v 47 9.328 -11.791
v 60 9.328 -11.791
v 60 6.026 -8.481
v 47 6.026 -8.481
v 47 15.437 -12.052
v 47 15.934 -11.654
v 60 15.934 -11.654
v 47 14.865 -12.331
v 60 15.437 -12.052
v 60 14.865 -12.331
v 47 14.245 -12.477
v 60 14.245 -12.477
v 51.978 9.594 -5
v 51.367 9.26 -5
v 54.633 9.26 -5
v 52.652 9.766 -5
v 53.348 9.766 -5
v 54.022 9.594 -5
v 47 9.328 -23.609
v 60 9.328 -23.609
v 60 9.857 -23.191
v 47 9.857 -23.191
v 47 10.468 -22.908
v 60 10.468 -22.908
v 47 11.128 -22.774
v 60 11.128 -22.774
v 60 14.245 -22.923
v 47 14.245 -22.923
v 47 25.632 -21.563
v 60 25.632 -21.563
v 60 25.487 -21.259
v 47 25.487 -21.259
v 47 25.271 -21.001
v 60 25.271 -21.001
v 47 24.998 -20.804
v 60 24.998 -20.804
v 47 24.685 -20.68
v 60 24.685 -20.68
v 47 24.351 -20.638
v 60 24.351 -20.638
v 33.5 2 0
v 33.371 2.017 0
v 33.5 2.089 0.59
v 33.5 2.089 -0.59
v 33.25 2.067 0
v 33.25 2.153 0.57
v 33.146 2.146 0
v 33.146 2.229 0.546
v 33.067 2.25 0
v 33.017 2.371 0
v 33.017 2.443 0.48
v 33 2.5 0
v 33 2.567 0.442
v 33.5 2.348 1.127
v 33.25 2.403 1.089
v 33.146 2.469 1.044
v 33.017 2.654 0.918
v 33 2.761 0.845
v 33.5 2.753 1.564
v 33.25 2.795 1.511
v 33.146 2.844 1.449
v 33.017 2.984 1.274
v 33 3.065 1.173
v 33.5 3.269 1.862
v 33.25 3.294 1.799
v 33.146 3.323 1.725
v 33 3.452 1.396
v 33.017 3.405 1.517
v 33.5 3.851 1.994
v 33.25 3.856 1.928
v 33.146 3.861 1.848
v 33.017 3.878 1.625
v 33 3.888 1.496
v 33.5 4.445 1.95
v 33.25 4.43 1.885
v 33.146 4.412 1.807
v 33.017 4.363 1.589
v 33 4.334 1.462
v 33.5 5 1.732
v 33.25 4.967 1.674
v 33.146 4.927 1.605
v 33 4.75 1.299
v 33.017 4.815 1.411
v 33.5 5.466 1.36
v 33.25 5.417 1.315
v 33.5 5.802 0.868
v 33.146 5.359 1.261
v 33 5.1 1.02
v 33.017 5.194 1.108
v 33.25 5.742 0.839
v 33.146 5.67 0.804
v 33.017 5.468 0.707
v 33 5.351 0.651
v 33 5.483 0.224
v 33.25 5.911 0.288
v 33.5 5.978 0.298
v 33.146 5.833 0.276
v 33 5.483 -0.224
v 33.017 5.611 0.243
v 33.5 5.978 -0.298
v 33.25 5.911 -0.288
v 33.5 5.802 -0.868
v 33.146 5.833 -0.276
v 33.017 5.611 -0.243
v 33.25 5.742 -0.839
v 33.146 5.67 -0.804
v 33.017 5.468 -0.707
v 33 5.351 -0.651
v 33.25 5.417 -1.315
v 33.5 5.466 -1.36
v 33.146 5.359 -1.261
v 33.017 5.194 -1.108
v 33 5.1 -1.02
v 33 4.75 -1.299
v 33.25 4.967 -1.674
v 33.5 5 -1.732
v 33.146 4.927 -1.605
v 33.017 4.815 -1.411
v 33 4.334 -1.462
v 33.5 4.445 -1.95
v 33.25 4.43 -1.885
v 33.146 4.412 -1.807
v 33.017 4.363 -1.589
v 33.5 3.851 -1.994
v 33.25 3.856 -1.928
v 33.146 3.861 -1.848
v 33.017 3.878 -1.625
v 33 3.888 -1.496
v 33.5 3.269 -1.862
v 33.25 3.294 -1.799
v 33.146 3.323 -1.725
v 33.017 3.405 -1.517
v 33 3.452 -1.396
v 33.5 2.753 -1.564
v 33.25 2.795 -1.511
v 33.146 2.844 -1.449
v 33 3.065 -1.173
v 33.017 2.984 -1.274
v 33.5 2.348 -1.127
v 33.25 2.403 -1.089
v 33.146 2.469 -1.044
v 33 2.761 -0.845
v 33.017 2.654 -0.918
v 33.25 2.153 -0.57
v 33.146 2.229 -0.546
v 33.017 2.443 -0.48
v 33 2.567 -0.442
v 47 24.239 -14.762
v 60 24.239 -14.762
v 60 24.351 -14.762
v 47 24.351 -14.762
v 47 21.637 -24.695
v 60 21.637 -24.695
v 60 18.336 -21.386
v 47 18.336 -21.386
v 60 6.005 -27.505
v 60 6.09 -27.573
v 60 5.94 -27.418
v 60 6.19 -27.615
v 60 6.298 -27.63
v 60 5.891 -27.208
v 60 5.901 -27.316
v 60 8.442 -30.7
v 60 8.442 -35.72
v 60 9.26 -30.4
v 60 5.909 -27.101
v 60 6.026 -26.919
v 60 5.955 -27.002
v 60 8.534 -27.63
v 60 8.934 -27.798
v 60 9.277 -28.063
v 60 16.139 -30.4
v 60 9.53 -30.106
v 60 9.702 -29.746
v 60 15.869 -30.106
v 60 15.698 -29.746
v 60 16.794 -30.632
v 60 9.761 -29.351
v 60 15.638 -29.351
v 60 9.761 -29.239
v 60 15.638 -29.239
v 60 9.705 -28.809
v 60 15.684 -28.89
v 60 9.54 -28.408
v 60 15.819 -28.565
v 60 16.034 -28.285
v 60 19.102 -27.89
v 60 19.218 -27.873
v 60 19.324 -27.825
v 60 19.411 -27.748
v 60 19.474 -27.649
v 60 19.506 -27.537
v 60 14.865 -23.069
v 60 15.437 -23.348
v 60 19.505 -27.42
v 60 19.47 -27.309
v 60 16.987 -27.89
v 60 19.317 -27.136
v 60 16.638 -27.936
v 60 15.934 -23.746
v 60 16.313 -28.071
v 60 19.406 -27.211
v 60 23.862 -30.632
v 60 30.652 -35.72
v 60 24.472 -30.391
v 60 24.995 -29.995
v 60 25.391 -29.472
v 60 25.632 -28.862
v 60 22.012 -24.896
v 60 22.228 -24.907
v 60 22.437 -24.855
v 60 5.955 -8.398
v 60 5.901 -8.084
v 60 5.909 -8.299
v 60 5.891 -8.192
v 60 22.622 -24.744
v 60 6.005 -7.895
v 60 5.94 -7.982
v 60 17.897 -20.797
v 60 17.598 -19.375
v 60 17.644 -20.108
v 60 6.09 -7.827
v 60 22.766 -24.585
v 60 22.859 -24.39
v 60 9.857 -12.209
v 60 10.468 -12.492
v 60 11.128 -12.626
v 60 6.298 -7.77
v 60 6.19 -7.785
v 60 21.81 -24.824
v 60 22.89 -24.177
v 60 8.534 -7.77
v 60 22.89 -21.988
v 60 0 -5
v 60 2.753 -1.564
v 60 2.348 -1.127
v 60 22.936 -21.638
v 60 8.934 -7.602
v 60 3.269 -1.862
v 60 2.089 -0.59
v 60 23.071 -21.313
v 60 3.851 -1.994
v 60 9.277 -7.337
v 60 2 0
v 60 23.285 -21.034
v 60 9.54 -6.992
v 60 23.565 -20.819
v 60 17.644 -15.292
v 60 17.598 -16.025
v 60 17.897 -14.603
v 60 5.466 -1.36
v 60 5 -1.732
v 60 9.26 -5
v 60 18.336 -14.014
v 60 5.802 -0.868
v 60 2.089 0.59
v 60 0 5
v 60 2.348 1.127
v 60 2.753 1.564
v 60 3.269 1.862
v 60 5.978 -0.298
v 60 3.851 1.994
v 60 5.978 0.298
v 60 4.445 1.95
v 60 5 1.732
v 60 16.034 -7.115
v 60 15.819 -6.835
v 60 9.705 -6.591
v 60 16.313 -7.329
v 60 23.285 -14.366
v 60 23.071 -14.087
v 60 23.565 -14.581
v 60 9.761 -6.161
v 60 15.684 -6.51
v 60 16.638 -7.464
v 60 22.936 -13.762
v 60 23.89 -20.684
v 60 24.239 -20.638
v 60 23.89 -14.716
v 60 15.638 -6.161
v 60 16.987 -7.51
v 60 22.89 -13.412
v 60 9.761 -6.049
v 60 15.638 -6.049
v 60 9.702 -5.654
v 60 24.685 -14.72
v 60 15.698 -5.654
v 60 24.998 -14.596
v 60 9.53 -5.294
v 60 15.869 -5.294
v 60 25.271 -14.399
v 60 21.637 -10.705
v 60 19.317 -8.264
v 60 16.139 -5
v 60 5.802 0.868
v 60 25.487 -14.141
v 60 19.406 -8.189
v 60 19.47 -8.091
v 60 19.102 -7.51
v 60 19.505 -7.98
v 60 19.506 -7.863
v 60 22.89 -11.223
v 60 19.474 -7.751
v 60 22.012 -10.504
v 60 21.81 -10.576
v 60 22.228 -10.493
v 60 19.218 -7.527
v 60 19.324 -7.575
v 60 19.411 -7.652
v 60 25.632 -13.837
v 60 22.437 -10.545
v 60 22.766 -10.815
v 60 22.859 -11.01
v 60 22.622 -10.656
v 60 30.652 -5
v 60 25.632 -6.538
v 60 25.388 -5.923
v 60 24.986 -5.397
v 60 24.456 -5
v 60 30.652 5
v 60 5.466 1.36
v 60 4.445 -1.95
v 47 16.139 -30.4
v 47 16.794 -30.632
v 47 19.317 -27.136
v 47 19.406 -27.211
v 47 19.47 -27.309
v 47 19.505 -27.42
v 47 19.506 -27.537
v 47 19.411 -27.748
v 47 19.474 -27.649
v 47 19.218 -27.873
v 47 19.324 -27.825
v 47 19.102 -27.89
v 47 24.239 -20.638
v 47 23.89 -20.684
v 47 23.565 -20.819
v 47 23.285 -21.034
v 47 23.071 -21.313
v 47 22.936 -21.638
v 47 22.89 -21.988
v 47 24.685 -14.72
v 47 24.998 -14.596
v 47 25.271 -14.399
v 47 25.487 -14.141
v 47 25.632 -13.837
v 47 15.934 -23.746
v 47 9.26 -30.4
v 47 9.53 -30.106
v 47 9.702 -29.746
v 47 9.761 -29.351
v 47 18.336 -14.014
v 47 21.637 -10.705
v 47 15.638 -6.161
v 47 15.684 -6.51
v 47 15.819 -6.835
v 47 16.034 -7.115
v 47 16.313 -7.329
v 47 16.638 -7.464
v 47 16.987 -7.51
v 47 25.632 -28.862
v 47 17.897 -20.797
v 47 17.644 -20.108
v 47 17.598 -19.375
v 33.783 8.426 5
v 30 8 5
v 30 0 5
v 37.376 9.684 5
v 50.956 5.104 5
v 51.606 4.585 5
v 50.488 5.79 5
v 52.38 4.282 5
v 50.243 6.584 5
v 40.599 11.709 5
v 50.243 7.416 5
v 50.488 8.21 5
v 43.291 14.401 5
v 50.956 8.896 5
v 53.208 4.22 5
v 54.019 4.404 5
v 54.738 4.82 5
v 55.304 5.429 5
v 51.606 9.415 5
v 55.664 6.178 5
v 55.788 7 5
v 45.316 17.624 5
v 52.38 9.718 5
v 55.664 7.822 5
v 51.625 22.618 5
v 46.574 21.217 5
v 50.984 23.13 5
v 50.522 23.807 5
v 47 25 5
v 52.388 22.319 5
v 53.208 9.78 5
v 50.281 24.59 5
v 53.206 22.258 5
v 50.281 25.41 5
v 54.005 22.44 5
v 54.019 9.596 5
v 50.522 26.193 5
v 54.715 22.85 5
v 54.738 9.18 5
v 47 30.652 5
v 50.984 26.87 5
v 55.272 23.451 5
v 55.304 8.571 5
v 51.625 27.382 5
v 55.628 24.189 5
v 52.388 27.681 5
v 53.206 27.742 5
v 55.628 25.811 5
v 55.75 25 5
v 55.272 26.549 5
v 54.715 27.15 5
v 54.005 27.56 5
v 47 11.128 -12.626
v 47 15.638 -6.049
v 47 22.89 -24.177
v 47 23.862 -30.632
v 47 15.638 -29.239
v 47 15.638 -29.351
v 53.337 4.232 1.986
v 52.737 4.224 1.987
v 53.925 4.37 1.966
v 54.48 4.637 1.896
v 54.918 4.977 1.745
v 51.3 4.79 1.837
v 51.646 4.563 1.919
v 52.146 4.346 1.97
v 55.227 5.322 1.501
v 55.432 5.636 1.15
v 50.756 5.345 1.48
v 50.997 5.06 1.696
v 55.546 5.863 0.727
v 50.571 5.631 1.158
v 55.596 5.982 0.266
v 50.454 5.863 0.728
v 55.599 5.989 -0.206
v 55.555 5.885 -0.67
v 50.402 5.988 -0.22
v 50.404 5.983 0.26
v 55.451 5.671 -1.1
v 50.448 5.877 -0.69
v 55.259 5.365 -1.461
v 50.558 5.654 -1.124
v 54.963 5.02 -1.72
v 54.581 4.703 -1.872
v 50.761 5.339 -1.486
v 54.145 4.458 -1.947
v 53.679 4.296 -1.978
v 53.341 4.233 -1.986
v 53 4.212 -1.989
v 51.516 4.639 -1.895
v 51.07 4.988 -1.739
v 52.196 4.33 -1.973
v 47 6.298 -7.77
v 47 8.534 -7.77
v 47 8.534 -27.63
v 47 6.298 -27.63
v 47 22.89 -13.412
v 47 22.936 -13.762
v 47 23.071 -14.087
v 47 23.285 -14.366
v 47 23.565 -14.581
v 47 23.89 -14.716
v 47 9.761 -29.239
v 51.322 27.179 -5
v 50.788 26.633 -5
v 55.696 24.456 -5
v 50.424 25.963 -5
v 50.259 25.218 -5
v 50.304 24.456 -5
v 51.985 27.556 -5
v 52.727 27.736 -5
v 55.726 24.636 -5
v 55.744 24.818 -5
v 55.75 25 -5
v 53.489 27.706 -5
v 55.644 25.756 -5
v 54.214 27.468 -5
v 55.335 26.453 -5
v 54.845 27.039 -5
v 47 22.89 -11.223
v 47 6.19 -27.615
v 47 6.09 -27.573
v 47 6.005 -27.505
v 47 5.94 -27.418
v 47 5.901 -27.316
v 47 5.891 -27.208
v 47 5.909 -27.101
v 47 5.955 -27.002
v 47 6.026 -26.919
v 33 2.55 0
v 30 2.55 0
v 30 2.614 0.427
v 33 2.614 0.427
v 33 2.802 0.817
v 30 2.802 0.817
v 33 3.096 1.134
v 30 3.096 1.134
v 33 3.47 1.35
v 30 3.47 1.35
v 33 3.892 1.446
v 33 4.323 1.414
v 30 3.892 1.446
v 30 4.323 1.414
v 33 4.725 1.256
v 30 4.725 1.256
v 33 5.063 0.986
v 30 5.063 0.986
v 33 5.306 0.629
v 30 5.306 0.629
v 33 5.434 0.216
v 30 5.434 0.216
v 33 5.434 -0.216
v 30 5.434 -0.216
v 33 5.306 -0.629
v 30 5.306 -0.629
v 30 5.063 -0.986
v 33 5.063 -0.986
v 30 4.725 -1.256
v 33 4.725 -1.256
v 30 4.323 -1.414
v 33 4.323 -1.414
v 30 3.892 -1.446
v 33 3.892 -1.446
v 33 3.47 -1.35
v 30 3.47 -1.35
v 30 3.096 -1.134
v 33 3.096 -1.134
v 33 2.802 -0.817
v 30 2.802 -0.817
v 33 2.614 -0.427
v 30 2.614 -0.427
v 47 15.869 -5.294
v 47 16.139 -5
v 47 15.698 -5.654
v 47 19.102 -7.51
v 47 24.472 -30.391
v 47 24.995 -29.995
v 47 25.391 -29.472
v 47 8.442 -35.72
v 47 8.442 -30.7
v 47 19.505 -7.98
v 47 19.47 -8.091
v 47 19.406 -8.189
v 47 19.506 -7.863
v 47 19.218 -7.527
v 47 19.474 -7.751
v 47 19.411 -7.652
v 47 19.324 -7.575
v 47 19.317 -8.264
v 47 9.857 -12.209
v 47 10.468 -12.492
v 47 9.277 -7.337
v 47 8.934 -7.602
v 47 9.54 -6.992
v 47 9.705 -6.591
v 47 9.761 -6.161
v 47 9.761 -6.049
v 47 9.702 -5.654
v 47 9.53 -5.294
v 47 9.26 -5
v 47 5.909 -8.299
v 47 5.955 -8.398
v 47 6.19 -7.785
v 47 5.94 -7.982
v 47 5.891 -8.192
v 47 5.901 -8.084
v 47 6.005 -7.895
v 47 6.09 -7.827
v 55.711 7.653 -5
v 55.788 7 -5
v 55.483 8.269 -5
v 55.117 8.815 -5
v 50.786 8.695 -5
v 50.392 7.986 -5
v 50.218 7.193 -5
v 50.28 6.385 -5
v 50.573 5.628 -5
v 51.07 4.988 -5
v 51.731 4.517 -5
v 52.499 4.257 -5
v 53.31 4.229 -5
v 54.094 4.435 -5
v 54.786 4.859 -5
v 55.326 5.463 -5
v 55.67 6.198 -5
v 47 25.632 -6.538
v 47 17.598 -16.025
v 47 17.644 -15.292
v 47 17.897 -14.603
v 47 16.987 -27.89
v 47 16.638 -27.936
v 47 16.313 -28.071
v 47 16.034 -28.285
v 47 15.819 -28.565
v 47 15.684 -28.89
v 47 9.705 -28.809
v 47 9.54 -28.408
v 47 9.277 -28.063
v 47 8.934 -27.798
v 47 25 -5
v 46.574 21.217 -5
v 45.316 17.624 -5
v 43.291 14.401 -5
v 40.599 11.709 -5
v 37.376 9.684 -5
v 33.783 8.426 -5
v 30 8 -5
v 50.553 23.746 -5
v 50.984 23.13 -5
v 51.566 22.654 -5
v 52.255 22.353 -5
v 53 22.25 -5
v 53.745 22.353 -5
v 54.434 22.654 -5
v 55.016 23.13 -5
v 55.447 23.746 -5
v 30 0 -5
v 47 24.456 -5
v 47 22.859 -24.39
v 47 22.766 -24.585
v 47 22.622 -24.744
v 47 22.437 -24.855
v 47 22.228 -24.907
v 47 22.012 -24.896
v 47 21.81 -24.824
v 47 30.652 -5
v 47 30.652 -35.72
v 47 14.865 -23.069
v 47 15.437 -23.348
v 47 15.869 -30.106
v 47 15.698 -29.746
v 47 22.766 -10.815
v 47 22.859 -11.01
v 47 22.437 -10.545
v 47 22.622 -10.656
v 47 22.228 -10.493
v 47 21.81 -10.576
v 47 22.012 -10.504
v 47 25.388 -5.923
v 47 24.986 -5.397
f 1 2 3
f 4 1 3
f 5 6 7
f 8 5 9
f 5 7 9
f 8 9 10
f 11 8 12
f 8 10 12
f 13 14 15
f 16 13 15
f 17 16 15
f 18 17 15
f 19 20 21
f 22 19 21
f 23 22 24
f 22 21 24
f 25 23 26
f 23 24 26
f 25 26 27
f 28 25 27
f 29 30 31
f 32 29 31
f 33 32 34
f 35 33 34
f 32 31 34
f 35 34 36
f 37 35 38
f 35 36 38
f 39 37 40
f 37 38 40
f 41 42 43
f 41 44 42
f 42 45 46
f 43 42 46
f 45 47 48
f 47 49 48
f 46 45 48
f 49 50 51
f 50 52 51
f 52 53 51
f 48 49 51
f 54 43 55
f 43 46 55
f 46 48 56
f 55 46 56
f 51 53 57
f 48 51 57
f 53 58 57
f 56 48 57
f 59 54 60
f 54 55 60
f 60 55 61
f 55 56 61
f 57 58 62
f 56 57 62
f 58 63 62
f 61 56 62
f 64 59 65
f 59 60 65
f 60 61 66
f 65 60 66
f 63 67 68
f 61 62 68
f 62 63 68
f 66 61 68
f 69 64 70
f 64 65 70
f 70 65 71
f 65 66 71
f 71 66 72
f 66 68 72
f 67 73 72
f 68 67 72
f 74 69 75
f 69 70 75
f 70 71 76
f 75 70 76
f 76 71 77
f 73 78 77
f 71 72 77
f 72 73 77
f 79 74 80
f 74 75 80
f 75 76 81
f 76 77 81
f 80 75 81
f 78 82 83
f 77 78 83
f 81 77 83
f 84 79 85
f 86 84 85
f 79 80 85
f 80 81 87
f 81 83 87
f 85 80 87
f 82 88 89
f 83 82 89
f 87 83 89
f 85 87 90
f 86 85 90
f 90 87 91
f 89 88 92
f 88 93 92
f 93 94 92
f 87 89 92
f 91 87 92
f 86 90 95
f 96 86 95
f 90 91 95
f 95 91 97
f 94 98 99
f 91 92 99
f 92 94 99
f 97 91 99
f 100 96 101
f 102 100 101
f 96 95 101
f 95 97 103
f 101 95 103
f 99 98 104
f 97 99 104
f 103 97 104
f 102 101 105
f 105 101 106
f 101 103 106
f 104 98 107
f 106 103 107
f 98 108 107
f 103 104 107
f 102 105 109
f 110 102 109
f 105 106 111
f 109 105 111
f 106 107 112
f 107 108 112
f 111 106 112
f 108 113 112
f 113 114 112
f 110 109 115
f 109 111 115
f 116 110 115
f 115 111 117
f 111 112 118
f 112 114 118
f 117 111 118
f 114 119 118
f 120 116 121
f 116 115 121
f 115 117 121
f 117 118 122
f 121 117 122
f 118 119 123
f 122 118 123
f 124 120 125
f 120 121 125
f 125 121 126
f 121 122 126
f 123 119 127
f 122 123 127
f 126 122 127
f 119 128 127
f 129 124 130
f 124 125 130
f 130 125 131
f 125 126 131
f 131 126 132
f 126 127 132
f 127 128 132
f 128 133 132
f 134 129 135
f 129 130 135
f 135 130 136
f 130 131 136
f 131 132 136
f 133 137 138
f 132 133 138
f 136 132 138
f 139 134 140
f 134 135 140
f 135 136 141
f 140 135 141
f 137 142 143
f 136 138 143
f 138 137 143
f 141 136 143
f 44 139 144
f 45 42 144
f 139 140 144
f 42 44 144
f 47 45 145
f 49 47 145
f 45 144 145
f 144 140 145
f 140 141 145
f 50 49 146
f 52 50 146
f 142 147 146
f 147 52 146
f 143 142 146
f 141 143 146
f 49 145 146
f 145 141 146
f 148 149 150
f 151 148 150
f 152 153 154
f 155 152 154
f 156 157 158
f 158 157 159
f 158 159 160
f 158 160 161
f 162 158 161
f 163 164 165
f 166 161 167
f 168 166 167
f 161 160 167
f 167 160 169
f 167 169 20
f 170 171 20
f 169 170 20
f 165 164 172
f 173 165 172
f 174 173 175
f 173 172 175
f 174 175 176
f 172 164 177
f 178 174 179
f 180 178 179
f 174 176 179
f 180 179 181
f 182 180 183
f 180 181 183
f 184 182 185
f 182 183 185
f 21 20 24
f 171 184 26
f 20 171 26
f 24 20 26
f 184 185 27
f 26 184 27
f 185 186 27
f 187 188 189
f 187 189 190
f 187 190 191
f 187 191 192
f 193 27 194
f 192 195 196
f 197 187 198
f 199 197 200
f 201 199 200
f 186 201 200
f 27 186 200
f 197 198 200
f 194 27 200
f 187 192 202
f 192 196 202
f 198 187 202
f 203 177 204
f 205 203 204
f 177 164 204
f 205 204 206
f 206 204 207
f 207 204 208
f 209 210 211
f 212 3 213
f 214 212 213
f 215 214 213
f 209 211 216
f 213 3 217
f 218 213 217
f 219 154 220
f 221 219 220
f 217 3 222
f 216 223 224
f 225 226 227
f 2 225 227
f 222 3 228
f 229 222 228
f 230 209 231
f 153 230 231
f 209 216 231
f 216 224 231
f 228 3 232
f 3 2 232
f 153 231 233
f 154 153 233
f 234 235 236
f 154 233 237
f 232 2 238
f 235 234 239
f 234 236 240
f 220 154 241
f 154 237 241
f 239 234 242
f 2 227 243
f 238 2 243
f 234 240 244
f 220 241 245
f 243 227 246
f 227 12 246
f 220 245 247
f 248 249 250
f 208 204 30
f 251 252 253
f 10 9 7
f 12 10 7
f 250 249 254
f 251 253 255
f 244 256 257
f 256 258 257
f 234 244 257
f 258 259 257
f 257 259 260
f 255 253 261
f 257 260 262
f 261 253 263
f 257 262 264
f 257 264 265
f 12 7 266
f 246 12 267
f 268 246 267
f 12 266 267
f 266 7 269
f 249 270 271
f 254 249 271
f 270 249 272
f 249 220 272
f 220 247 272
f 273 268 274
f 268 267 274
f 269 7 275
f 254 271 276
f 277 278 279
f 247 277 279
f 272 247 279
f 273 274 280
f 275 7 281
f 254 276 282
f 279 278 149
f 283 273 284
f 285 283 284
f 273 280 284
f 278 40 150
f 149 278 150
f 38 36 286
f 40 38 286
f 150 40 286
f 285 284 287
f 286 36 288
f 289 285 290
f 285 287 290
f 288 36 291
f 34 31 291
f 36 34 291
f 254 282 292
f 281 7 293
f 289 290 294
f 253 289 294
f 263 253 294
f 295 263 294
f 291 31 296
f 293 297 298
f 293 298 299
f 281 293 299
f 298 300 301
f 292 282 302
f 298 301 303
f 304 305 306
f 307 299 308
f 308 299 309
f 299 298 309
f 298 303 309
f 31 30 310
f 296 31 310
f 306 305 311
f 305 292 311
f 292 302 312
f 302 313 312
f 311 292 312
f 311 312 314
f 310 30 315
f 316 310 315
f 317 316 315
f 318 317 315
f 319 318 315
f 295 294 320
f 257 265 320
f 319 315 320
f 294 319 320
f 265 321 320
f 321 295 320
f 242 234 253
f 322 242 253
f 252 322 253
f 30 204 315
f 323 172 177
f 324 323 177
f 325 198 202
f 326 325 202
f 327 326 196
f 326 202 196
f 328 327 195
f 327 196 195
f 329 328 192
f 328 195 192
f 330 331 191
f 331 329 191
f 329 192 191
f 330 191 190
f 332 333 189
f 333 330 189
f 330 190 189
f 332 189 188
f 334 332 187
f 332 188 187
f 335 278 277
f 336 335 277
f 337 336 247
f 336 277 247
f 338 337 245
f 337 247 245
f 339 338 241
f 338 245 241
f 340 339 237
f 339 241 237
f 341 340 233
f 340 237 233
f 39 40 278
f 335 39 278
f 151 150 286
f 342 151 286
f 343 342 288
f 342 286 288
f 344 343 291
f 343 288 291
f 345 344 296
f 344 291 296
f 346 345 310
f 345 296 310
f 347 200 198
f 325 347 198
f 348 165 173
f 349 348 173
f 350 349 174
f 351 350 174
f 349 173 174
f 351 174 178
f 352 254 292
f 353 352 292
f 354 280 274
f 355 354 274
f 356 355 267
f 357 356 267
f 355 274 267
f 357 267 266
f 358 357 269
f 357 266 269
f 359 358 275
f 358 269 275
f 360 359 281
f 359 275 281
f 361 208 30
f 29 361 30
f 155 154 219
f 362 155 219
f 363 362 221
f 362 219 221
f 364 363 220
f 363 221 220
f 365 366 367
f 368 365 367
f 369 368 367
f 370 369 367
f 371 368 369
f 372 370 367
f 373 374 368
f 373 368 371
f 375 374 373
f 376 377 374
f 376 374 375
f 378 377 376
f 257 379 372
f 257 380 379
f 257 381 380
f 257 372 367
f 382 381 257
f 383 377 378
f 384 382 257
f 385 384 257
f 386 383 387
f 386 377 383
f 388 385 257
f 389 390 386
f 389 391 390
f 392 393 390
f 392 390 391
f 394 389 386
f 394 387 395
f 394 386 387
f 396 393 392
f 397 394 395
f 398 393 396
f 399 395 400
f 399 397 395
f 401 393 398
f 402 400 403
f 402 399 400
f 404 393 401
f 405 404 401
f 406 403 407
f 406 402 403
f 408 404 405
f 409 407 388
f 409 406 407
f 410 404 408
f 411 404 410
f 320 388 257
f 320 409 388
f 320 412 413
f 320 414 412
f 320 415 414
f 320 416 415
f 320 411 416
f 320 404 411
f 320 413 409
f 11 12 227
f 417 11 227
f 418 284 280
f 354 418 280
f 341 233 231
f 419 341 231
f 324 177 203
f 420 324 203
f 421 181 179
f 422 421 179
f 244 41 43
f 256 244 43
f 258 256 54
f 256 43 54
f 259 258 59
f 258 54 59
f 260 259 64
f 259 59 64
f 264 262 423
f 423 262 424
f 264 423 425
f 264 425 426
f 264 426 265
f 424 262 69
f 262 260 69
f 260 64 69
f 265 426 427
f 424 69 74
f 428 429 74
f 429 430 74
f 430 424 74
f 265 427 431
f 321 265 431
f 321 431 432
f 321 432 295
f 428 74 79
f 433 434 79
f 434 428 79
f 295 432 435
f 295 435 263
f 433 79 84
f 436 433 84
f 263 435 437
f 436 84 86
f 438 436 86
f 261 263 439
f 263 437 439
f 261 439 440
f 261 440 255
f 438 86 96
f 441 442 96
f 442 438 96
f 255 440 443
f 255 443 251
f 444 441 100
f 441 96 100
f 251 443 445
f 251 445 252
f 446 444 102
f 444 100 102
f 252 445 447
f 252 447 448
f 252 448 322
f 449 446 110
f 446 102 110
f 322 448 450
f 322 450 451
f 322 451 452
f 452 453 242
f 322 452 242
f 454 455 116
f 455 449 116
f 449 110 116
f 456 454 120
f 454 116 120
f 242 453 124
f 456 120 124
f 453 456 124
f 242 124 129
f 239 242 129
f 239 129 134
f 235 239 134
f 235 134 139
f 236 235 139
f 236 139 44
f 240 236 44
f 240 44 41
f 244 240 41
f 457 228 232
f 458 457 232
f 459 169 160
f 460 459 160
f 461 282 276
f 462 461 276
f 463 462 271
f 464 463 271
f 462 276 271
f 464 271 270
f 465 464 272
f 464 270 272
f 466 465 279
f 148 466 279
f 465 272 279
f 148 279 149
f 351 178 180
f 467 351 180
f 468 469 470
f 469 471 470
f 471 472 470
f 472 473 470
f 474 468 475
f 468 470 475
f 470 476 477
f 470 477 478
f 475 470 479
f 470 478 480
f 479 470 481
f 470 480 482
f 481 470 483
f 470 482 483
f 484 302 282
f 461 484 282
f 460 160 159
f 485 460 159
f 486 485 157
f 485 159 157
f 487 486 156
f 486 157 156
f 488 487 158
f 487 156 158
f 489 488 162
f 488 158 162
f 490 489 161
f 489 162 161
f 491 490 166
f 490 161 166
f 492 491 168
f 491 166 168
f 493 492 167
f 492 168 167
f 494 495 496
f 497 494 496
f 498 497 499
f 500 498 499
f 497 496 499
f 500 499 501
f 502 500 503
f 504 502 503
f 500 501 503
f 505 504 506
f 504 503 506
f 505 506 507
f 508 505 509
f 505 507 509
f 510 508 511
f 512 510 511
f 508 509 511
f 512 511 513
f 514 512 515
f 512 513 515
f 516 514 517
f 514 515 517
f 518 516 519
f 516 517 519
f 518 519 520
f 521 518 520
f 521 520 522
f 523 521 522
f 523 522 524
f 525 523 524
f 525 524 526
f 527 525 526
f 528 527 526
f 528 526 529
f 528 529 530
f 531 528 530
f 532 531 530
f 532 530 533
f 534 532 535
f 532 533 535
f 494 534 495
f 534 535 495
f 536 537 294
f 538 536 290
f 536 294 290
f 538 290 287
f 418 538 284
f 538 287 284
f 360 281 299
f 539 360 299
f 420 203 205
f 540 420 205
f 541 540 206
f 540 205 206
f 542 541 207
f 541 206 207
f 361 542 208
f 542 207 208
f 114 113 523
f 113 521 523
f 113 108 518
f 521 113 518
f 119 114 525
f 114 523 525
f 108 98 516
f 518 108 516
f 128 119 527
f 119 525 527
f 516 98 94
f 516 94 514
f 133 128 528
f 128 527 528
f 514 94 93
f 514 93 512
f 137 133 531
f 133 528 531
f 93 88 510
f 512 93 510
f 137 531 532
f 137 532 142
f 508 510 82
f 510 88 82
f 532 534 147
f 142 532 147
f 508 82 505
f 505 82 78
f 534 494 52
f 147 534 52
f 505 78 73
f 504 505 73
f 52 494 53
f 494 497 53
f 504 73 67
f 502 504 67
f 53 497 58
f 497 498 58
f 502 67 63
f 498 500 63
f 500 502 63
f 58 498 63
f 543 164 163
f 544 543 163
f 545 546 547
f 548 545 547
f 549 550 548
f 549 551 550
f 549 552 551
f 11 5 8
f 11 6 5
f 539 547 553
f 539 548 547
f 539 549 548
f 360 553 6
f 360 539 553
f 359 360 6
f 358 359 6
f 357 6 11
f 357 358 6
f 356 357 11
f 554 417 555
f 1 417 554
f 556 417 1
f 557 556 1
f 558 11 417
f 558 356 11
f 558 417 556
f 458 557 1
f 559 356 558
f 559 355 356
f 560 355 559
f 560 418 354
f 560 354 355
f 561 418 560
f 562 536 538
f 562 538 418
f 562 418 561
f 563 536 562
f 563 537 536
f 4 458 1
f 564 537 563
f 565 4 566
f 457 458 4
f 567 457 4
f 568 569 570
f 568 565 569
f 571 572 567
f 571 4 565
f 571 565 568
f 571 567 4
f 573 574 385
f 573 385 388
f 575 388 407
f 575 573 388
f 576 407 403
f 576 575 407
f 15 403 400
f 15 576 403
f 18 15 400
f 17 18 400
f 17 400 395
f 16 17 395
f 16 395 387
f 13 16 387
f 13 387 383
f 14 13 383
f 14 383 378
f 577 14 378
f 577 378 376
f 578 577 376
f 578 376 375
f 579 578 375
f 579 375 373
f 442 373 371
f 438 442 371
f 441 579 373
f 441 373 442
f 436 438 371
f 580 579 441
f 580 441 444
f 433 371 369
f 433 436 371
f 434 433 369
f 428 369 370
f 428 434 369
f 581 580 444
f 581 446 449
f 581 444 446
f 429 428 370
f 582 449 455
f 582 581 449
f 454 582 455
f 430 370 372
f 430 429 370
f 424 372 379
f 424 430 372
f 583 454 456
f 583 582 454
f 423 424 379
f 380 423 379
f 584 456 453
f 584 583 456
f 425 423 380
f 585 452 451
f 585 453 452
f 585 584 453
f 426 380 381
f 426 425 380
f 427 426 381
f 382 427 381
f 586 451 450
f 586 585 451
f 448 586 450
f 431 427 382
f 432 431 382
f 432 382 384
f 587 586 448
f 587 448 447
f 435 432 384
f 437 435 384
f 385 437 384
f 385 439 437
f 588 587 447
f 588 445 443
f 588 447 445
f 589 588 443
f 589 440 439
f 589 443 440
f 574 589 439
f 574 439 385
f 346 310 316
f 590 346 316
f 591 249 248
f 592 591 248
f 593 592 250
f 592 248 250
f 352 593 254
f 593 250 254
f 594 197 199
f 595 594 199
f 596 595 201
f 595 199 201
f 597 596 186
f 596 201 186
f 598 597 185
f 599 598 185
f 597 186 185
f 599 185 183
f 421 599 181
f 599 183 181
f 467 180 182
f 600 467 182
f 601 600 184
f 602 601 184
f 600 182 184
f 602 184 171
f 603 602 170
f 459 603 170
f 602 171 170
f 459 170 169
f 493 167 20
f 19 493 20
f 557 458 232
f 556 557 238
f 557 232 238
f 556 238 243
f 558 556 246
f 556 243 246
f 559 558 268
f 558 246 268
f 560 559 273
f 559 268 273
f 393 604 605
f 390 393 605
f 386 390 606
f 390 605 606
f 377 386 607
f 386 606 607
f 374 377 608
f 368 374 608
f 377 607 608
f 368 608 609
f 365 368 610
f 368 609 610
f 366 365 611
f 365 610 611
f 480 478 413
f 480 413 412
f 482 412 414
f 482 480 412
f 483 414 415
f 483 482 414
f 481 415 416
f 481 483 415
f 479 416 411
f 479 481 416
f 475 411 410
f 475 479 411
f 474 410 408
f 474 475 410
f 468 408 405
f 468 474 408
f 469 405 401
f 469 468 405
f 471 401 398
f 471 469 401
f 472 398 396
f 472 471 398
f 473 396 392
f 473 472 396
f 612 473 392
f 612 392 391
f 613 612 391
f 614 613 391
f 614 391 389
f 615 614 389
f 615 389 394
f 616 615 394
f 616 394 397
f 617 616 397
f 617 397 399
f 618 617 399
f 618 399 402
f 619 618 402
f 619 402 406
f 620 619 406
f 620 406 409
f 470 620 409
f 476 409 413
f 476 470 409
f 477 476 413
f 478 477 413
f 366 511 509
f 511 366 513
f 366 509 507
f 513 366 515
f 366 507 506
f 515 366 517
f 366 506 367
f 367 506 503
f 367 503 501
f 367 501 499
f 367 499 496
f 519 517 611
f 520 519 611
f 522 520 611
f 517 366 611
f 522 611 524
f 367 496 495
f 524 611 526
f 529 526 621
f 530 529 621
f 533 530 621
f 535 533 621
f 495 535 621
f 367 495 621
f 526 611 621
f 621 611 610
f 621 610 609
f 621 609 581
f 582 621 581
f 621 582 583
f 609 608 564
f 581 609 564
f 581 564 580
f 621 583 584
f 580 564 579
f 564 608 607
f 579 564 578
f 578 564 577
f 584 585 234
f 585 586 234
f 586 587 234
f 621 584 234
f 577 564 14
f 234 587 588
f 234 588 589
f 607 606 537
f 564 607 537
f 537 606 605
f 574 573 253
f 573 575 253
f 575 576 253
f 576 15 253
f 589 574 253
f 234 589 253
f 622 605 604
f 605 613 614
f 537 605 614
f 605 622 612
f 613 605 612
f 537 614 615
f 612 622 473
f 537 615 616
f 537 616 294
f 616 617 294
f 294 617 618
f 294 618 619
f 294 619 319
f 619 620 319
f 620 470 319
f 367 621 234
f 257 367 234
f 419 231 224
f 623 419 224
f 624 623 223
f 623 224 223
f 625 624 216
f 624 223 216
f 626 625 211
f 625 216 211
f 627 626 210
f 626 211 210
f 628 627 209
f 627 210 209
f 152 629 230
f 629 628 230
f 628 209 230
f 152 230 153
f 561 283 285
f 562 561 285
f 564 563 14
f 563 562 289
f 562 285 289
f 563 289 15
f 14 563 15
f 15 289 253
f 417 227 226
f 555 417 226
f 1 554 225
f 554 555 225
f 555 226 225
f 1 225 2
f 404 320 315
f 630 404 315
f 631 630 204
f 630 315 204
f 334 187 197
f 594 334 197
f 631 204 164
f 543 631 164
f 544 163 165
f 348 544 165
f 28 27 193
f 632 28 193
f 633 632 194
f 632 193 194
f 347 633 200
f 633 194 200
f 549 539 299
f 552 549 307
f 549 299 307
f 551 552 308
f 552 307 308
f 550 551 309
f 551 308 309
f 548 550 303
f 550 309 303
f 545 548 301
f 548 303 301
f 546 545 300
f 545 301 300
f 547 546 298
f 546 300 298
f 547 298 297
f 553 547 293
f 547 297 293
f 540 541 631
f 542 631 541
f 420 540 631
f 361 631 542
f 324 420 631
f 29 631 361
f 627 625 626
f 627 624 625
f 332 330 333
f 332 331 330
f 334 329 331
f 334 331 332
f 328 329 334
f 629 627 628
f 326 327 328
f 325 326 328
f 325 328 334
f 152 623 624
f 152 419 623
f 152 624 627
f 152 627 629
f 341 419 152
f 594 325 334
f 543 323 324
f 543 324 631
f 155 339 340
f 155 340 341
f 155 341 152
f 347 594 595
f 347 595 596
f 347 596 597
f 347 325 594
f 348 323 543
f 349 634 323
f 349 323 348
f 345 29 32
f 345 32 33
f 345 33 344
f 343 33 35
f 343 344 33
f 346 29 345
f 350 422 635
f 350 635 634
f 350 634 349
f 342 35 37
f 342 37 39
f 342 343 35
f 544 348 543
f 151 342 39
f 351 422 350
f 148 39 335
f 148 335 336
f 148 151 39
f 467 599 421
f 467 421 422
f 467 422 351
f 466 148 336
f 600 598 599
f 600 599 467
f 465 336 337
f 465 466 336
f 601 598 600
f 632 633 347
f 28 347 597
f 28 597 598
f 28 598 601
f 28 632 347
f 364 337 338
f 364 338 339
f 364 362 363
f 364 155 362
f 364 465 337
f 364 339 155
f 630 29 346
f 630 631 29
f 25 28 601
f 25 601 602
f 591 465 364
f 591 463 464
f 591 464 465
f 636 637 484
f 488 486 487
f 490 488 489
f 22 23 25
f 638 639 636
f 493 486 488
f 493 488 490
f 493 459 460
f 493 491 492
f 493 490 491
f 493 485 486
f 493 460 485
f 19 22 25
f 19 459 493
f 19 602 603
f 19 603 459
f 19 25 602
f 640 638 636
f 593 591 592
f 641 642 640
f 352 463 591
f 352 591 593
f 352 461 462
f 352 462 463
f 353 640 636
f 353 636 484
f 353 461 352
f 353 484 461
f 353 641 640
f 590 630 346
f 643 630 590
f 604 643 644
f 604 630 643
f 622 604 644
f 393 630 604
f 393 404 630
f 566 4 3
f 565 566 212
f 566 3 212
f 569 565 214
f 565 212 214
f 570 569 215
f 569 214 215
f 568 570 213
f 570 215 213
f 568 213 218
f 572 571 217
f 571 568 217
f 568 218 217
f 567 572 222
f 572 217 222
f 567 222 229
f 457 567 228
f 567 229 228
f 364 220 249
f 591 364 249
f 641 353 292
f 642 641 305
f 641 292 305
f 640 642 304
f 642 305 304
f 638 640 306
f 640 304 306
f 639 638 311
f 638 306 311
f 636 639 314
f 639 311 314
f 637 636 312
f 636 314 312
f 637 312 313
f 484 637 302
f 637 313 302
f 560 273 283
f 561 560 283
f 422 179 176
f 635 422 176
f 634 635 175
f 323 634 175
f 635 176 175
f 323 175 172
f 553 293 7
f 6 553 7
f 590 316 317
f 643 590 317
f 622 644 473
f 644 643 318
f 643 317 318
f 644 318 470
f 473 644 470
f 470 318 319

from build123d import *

# Parameters (mm, degrees)
BOSS_EXTRUDE1_DEPTH      = 5
BOSS_EXTRUDE1_DEPTH_BACK = 5
SKETCH7_R                = 2.788241988
SKETCH7_R_2              = 2.75
BOSS_EXTRUDE2_REACH      = 46.511
CUT_EXTRUDE3_REACH       = 76.833
SKETCH14_W               = 13
SKETCH14_H               = 1.848424097
SKETCH15_R               = 1.45
CUT_EXTRUDE4_DEPTH       = 3
CUT_EXTRUDE5_REACH       = 56.263
SKETCH16_R               = 2
FILLET1_R                = 0.5


with BuildPart() as part:
    # Sketch7 → Boss-Extrude1 (new, two sides: drawn at the far end of the back side and taken through both)
    with BuildSketch(Plane.XY.offset(-BOSS_EXTRUDE1_DEPTH_BACK)):
        with BuildLine():
            Line((30, 8), (30, 0))
            Line((30, 0), (60, 0))
            Line((60, 0), (60, 32.5))
            Line((60, 32.5), (47, 32.5))
            Line((47, 32.5), (47, 25))
            ThreePointArc((47, 25), (42.02081528, 12.97918472), (30, 8))
        make_face()
        with Locations((53, 7)):
            Circle(SKETCH7_R, mode=Mode.SUBTRACT)
        with Locations((53, 25)):
            Circle(SKETCH7_R_2, mode=Mode.SUBTRACT)
    extrude(amount=BOSS_EXTRUDE1_DEPTH + BOSS_EXTRUDE1_DEPTH_BACK)

    # Boss-Extrude2: up to this face of the body (flat: up to its plane)
    boss_extrude2_end = Plane(part.part.faces().sort_by_distance((47, 28.75, 0))[0])
    # Sketch8 → Boss-Extrude2 (add, up to the picked face)
    with BuildSketch(Plane(origin=(60, 0, 0), x_dir=(0, 0, -1), z_dir=(1, 0, 0)), mode=Mode.PRIVATE) as boss_extrude2_sk1:
        with BuildLine():
            Line((7.770224858, 6.297913321), (7.77021842, 8.534450023))
            ThreePointArc((7.77021842, 8.534450023), (7.172653823, 9.41960576), (6.160789156, 9.761240102))
            Line((6.160789156, 9.761240102), (6.049331791, 9.761231883))
            ThreePointArc((6.049331791, 9.761231883), (5.467920254, 9.629507338), (5, 9.260127632))
            Line((5, 9.260127632), (5, 16.139290416))
            ThreePointArc((5, 16.139290416), (5.467793594, 15.770087219), (6.049012407, 15.638456908))
            Line((6.049012407, 15.638456908), (6.160787586, 15.638456908))
            ThreePointArc((6.160787586, 15.638456908), (7.114683416, 16.033573497), (7.509800005, 16.987469327))
            Line((7.509800005, 16.987469327), (7.509800005, 19.102089972))
            ThreePointArc((7.509800005, 19.102089972), (7.80571774, 19.4939479), (8.26359849, 19.316563682))
            Line((8.26359849, 19.316563682), (11.653749185, 15.934160795))
            ThreePointArc((11.653749185, 15.934160795), (12.207484328, 15.158579301), (12.477275173, 14.244597811))
            Line((12.477275173, 14.244597811), (12.625702616, 11.128406988))
            ThreePointArc((12.625702616, 11.128406988), (12.368540167, 10.154062981), (11.790945096, 9.328313198))
            Line((11.790945096, 9.328313198), (8.480768071, 6.02568809))
            ThreePointArc((8.480768071, 6.02568809), (8.03188202, 5.917454844), (7.770224858, 6.297913321))
        make_face()
    boss_extrude2_tool1 = split(extrude(boss_extrude2_sk1.sketch, amount=-BOSS_EXTRUDE2_REACH, mode=Mode.PRIVATE), bisect_by=boss_extrude2_end, keep=Keep.BOTH, mode=Mode.PRIVATE)
    # Sketch8 → Boss-Extrude2 (add, up to the picked face)
    with BuildSketch(Plane(origin=(60, 0, 0), x_dir=(0, 0, -1), z_dir=(1, 0, 0)), mode=Mode.PRIVATE) as boss_extrude2_sk2:
        with BuildLine():
            Line((30.631565341, 16.79432062), (30.631565341, 23.861822271))
            ThreePointArc((30.631565341, 23.861822271), (29.994638774, 24.994670327), (28.861778916, 25.631575903))
            Line((28.861778916, 25.631575903), (21.563333135, 25.631575903))
            ThreePointArc((21.563333135, 25.631575903), (20.893881396, 25.140801297), (20.6385, 24.350987593))
            Line((20.6385, 24.350987593), (20.6385, 24.239212407))
            ThreePointArc((20.6385, 24.239212407), (21.033616586, 23.285316586), (21.987512407, 22.8902))
            Line((21.987512407, 22.8902), (24.176788598, 22.8902))
            ThreePointArc((24.176788598, 22.8902), (24.854992901, 22.436757749), (24.695146796, 21.63674514))
            Line((24.695146796, 21.63674514), (21.386383353, 18.335543623))
            ThreePointArc((21.386383353, 18.335543623), (20.461951665, 17.745653619), (19.375383804, 17.597618335))
            Line((19.375383804, 17.597618335), (16.024616196, 17.597618335))
            ThreePointArc((16.024616196, 17.597618335), (14.938048335, 17.745653619), (14.013616647, 18.335543623))
            Line((14.013616647, 18.335543623), (10.704853204, 21.63674514))
            ThreePointArc((10.704853204, 21.63674514), (10.545007099, 22.436757749), (11.223211402, 22.8902))
            Line((11.223211402, 22.8902), (13.412487593, 22.8902))
            ThreePointArc((13.412487593, 22.8902), (14.366383414, 23.285316586), (14.7615, 24.239212407))
            Line((14.7615, 24.239212407), (14.7615, 24.350987593))
            ThreePointArc((14.7615, 24.350987593), (14.506118604, 25.140801297), (13.836666865, 25.631575903))
            Line((13.836666865, 25.631575903), (6.538221084, 25.631575903))
            ThreePointArc((6.538221084, 25.631575903), (5.64574769, 25.205085259), (5, 24.455810309))
            Line((5, 24.455810309), (5, 30.651575903))
            Line((5, 30.651575903), (35.719846982, 30.651575903))
            Line((35.719846982, 30.651575903), (35.719846982, 25.680977676))
            Line((35.719846982, 25.680977676), (35.719846982, 8.441932485))
            Line((35.719846982, 8.441932485), (30.699526538, 8.441932485))
            Line((30.699526538, 8.441932485), (30.4, 9.260127632))
            ThreePointArc((30.4, 9.260127632), (29.932079746, 9.629507338), (29.350668209, 9.761231883))
            Line((29.350668209, 9.761231883), (29.239210844, 9.761240102))
            ThreePointArc((29.239210844, 9.761240102), (28.227346177, 9.41960576), (27.62978158, 8.534450023))
            Line((27.62978158, 8.534450023), (27.629775142, 6.29790377))
            ThreePointArc((27.629775142, 6.29790377), (27.368113521, 5.917453135), (26.919231929, 6.02568809))
            Line((26.919231929, 6.02568809), (23.609054904, 9.328313198))
            ThreePointArc((23.609054904, 9.328313198), (23.031459833, 10.154062981), (22.774297384, 11.128406988))
            Line((22.774297384, 11.128406988), (22.922724827, 14.244597811))
            ThreePointArc((22.922724827, 14.244597811), (23.192519205, 15.158586549), (23.746262232, 15.934172186))
            Line((23.746262232, 15.934172186), (27.13640151, 19.316563682))
            ThreePointArc((27.13640151, 19.316563682), (27.594282383, 19.493947864), (27.890199995, 19.102089715))
            Line((27.890199995, 19.102089715), (27.890199995, 16.987469327))
            ThreePointArc((27.890199995, 16.987469327), (28.285316584, 16.033573497), (29.239212414, 15.638456908))
            Line((29.239212414, 15.638456908), (29.350987593, 15.638456908))
            ThreePointArc((29.350987593, 15.638456908), (29.932206406, 15.770087219), (30.4, 16.139290416))
            Line((30.4, 16.139290416), (30.631565341, 16.79432062))
        make_face()
    boss_extrude2_tool2 = split(extrude(boss_extrude2_sk2.sketch, amount=-BOSS_EXTRUDE2_REACH, mode=Mode.PRIVATE), bisect_by=boss_extrude2_end, keep=Keep.BOTH, mode=Mode.PRIVATE)
    add(boss_extrude2_tool1.solids().sort_by(Axis((60, 12.678642, -8.819589), (-1, 0, 0)))[0])
    add(boss_extrude2_tool2.solids().sort_by(Axis((60, 21.642021, -23.841508), (-1, 0, 0)))[0])

    # Sketch14 → Cut-Extrude3 (cut, up to next)
    with BuildSketch(Plane(origin=(0, 0, -5), x_dir=(-1, 0, 0), z_dir=(0, 0, -1)), mode=Mode.PRIVATE) as cut_extrude3_sk1:
        with Locations((-53.5, 31.575787952)):
            Rectangle(SKETCH14_W, SKETCH14_H)
    cut_extrude3_tool1 = extrude(cut_extrude3_sk1.sketch, amount=-CUT_EXTRUDE3_REACH, mode=Mode.PRIVATE) & part.part
    add(cut_extrude3_tool1.solids().sort_by_distance((53.5, 31.575788, -5))[0], mode=Mode.SUBTRACT)

    # Sketch15 → Cut-Extrude4 (cut)
    with BuildSketch(Plane.ZY.offset(-30)):
        with Locations(Location((0, 4, 0), (0, 0, 270))):
            Circle(SKETCH15_R)
    extrude(amount=-CUT_EXTRUDE4_DEPTH, mode=Mode.SUBTRACT)

    # Sketch16 → Cut-Extrude5 (cut, up to next)
    with BuildSketch(Plane.ZY.offset(-33), mode=Mode.PRIVATE) as cut_extrude5_sk1:
        with Locations(Location((0, 4, 0), (0, 0, 270))):
            Circle(SKETCH16_R)
    cut_extrude5_tool1 = extrude(cut_extrude5_sk1.sketch, amount=-CUT_EXTRUDE5_REACH, mode=Mode.PRIVATE) & part.part
    add(cut_extrude5_tool1.solids().sort_by_distance((33, 4, 0))[0], mode=Mode.SUBTRACT)

    # Fillet1
    fillet1_edges = [part.edges().sort_by_distance(p)[0] for p in [
        (33, 6, 0),
    ]]
    fillet(fillet1_edges, radius=FILLET1_R)


solid = part.part
